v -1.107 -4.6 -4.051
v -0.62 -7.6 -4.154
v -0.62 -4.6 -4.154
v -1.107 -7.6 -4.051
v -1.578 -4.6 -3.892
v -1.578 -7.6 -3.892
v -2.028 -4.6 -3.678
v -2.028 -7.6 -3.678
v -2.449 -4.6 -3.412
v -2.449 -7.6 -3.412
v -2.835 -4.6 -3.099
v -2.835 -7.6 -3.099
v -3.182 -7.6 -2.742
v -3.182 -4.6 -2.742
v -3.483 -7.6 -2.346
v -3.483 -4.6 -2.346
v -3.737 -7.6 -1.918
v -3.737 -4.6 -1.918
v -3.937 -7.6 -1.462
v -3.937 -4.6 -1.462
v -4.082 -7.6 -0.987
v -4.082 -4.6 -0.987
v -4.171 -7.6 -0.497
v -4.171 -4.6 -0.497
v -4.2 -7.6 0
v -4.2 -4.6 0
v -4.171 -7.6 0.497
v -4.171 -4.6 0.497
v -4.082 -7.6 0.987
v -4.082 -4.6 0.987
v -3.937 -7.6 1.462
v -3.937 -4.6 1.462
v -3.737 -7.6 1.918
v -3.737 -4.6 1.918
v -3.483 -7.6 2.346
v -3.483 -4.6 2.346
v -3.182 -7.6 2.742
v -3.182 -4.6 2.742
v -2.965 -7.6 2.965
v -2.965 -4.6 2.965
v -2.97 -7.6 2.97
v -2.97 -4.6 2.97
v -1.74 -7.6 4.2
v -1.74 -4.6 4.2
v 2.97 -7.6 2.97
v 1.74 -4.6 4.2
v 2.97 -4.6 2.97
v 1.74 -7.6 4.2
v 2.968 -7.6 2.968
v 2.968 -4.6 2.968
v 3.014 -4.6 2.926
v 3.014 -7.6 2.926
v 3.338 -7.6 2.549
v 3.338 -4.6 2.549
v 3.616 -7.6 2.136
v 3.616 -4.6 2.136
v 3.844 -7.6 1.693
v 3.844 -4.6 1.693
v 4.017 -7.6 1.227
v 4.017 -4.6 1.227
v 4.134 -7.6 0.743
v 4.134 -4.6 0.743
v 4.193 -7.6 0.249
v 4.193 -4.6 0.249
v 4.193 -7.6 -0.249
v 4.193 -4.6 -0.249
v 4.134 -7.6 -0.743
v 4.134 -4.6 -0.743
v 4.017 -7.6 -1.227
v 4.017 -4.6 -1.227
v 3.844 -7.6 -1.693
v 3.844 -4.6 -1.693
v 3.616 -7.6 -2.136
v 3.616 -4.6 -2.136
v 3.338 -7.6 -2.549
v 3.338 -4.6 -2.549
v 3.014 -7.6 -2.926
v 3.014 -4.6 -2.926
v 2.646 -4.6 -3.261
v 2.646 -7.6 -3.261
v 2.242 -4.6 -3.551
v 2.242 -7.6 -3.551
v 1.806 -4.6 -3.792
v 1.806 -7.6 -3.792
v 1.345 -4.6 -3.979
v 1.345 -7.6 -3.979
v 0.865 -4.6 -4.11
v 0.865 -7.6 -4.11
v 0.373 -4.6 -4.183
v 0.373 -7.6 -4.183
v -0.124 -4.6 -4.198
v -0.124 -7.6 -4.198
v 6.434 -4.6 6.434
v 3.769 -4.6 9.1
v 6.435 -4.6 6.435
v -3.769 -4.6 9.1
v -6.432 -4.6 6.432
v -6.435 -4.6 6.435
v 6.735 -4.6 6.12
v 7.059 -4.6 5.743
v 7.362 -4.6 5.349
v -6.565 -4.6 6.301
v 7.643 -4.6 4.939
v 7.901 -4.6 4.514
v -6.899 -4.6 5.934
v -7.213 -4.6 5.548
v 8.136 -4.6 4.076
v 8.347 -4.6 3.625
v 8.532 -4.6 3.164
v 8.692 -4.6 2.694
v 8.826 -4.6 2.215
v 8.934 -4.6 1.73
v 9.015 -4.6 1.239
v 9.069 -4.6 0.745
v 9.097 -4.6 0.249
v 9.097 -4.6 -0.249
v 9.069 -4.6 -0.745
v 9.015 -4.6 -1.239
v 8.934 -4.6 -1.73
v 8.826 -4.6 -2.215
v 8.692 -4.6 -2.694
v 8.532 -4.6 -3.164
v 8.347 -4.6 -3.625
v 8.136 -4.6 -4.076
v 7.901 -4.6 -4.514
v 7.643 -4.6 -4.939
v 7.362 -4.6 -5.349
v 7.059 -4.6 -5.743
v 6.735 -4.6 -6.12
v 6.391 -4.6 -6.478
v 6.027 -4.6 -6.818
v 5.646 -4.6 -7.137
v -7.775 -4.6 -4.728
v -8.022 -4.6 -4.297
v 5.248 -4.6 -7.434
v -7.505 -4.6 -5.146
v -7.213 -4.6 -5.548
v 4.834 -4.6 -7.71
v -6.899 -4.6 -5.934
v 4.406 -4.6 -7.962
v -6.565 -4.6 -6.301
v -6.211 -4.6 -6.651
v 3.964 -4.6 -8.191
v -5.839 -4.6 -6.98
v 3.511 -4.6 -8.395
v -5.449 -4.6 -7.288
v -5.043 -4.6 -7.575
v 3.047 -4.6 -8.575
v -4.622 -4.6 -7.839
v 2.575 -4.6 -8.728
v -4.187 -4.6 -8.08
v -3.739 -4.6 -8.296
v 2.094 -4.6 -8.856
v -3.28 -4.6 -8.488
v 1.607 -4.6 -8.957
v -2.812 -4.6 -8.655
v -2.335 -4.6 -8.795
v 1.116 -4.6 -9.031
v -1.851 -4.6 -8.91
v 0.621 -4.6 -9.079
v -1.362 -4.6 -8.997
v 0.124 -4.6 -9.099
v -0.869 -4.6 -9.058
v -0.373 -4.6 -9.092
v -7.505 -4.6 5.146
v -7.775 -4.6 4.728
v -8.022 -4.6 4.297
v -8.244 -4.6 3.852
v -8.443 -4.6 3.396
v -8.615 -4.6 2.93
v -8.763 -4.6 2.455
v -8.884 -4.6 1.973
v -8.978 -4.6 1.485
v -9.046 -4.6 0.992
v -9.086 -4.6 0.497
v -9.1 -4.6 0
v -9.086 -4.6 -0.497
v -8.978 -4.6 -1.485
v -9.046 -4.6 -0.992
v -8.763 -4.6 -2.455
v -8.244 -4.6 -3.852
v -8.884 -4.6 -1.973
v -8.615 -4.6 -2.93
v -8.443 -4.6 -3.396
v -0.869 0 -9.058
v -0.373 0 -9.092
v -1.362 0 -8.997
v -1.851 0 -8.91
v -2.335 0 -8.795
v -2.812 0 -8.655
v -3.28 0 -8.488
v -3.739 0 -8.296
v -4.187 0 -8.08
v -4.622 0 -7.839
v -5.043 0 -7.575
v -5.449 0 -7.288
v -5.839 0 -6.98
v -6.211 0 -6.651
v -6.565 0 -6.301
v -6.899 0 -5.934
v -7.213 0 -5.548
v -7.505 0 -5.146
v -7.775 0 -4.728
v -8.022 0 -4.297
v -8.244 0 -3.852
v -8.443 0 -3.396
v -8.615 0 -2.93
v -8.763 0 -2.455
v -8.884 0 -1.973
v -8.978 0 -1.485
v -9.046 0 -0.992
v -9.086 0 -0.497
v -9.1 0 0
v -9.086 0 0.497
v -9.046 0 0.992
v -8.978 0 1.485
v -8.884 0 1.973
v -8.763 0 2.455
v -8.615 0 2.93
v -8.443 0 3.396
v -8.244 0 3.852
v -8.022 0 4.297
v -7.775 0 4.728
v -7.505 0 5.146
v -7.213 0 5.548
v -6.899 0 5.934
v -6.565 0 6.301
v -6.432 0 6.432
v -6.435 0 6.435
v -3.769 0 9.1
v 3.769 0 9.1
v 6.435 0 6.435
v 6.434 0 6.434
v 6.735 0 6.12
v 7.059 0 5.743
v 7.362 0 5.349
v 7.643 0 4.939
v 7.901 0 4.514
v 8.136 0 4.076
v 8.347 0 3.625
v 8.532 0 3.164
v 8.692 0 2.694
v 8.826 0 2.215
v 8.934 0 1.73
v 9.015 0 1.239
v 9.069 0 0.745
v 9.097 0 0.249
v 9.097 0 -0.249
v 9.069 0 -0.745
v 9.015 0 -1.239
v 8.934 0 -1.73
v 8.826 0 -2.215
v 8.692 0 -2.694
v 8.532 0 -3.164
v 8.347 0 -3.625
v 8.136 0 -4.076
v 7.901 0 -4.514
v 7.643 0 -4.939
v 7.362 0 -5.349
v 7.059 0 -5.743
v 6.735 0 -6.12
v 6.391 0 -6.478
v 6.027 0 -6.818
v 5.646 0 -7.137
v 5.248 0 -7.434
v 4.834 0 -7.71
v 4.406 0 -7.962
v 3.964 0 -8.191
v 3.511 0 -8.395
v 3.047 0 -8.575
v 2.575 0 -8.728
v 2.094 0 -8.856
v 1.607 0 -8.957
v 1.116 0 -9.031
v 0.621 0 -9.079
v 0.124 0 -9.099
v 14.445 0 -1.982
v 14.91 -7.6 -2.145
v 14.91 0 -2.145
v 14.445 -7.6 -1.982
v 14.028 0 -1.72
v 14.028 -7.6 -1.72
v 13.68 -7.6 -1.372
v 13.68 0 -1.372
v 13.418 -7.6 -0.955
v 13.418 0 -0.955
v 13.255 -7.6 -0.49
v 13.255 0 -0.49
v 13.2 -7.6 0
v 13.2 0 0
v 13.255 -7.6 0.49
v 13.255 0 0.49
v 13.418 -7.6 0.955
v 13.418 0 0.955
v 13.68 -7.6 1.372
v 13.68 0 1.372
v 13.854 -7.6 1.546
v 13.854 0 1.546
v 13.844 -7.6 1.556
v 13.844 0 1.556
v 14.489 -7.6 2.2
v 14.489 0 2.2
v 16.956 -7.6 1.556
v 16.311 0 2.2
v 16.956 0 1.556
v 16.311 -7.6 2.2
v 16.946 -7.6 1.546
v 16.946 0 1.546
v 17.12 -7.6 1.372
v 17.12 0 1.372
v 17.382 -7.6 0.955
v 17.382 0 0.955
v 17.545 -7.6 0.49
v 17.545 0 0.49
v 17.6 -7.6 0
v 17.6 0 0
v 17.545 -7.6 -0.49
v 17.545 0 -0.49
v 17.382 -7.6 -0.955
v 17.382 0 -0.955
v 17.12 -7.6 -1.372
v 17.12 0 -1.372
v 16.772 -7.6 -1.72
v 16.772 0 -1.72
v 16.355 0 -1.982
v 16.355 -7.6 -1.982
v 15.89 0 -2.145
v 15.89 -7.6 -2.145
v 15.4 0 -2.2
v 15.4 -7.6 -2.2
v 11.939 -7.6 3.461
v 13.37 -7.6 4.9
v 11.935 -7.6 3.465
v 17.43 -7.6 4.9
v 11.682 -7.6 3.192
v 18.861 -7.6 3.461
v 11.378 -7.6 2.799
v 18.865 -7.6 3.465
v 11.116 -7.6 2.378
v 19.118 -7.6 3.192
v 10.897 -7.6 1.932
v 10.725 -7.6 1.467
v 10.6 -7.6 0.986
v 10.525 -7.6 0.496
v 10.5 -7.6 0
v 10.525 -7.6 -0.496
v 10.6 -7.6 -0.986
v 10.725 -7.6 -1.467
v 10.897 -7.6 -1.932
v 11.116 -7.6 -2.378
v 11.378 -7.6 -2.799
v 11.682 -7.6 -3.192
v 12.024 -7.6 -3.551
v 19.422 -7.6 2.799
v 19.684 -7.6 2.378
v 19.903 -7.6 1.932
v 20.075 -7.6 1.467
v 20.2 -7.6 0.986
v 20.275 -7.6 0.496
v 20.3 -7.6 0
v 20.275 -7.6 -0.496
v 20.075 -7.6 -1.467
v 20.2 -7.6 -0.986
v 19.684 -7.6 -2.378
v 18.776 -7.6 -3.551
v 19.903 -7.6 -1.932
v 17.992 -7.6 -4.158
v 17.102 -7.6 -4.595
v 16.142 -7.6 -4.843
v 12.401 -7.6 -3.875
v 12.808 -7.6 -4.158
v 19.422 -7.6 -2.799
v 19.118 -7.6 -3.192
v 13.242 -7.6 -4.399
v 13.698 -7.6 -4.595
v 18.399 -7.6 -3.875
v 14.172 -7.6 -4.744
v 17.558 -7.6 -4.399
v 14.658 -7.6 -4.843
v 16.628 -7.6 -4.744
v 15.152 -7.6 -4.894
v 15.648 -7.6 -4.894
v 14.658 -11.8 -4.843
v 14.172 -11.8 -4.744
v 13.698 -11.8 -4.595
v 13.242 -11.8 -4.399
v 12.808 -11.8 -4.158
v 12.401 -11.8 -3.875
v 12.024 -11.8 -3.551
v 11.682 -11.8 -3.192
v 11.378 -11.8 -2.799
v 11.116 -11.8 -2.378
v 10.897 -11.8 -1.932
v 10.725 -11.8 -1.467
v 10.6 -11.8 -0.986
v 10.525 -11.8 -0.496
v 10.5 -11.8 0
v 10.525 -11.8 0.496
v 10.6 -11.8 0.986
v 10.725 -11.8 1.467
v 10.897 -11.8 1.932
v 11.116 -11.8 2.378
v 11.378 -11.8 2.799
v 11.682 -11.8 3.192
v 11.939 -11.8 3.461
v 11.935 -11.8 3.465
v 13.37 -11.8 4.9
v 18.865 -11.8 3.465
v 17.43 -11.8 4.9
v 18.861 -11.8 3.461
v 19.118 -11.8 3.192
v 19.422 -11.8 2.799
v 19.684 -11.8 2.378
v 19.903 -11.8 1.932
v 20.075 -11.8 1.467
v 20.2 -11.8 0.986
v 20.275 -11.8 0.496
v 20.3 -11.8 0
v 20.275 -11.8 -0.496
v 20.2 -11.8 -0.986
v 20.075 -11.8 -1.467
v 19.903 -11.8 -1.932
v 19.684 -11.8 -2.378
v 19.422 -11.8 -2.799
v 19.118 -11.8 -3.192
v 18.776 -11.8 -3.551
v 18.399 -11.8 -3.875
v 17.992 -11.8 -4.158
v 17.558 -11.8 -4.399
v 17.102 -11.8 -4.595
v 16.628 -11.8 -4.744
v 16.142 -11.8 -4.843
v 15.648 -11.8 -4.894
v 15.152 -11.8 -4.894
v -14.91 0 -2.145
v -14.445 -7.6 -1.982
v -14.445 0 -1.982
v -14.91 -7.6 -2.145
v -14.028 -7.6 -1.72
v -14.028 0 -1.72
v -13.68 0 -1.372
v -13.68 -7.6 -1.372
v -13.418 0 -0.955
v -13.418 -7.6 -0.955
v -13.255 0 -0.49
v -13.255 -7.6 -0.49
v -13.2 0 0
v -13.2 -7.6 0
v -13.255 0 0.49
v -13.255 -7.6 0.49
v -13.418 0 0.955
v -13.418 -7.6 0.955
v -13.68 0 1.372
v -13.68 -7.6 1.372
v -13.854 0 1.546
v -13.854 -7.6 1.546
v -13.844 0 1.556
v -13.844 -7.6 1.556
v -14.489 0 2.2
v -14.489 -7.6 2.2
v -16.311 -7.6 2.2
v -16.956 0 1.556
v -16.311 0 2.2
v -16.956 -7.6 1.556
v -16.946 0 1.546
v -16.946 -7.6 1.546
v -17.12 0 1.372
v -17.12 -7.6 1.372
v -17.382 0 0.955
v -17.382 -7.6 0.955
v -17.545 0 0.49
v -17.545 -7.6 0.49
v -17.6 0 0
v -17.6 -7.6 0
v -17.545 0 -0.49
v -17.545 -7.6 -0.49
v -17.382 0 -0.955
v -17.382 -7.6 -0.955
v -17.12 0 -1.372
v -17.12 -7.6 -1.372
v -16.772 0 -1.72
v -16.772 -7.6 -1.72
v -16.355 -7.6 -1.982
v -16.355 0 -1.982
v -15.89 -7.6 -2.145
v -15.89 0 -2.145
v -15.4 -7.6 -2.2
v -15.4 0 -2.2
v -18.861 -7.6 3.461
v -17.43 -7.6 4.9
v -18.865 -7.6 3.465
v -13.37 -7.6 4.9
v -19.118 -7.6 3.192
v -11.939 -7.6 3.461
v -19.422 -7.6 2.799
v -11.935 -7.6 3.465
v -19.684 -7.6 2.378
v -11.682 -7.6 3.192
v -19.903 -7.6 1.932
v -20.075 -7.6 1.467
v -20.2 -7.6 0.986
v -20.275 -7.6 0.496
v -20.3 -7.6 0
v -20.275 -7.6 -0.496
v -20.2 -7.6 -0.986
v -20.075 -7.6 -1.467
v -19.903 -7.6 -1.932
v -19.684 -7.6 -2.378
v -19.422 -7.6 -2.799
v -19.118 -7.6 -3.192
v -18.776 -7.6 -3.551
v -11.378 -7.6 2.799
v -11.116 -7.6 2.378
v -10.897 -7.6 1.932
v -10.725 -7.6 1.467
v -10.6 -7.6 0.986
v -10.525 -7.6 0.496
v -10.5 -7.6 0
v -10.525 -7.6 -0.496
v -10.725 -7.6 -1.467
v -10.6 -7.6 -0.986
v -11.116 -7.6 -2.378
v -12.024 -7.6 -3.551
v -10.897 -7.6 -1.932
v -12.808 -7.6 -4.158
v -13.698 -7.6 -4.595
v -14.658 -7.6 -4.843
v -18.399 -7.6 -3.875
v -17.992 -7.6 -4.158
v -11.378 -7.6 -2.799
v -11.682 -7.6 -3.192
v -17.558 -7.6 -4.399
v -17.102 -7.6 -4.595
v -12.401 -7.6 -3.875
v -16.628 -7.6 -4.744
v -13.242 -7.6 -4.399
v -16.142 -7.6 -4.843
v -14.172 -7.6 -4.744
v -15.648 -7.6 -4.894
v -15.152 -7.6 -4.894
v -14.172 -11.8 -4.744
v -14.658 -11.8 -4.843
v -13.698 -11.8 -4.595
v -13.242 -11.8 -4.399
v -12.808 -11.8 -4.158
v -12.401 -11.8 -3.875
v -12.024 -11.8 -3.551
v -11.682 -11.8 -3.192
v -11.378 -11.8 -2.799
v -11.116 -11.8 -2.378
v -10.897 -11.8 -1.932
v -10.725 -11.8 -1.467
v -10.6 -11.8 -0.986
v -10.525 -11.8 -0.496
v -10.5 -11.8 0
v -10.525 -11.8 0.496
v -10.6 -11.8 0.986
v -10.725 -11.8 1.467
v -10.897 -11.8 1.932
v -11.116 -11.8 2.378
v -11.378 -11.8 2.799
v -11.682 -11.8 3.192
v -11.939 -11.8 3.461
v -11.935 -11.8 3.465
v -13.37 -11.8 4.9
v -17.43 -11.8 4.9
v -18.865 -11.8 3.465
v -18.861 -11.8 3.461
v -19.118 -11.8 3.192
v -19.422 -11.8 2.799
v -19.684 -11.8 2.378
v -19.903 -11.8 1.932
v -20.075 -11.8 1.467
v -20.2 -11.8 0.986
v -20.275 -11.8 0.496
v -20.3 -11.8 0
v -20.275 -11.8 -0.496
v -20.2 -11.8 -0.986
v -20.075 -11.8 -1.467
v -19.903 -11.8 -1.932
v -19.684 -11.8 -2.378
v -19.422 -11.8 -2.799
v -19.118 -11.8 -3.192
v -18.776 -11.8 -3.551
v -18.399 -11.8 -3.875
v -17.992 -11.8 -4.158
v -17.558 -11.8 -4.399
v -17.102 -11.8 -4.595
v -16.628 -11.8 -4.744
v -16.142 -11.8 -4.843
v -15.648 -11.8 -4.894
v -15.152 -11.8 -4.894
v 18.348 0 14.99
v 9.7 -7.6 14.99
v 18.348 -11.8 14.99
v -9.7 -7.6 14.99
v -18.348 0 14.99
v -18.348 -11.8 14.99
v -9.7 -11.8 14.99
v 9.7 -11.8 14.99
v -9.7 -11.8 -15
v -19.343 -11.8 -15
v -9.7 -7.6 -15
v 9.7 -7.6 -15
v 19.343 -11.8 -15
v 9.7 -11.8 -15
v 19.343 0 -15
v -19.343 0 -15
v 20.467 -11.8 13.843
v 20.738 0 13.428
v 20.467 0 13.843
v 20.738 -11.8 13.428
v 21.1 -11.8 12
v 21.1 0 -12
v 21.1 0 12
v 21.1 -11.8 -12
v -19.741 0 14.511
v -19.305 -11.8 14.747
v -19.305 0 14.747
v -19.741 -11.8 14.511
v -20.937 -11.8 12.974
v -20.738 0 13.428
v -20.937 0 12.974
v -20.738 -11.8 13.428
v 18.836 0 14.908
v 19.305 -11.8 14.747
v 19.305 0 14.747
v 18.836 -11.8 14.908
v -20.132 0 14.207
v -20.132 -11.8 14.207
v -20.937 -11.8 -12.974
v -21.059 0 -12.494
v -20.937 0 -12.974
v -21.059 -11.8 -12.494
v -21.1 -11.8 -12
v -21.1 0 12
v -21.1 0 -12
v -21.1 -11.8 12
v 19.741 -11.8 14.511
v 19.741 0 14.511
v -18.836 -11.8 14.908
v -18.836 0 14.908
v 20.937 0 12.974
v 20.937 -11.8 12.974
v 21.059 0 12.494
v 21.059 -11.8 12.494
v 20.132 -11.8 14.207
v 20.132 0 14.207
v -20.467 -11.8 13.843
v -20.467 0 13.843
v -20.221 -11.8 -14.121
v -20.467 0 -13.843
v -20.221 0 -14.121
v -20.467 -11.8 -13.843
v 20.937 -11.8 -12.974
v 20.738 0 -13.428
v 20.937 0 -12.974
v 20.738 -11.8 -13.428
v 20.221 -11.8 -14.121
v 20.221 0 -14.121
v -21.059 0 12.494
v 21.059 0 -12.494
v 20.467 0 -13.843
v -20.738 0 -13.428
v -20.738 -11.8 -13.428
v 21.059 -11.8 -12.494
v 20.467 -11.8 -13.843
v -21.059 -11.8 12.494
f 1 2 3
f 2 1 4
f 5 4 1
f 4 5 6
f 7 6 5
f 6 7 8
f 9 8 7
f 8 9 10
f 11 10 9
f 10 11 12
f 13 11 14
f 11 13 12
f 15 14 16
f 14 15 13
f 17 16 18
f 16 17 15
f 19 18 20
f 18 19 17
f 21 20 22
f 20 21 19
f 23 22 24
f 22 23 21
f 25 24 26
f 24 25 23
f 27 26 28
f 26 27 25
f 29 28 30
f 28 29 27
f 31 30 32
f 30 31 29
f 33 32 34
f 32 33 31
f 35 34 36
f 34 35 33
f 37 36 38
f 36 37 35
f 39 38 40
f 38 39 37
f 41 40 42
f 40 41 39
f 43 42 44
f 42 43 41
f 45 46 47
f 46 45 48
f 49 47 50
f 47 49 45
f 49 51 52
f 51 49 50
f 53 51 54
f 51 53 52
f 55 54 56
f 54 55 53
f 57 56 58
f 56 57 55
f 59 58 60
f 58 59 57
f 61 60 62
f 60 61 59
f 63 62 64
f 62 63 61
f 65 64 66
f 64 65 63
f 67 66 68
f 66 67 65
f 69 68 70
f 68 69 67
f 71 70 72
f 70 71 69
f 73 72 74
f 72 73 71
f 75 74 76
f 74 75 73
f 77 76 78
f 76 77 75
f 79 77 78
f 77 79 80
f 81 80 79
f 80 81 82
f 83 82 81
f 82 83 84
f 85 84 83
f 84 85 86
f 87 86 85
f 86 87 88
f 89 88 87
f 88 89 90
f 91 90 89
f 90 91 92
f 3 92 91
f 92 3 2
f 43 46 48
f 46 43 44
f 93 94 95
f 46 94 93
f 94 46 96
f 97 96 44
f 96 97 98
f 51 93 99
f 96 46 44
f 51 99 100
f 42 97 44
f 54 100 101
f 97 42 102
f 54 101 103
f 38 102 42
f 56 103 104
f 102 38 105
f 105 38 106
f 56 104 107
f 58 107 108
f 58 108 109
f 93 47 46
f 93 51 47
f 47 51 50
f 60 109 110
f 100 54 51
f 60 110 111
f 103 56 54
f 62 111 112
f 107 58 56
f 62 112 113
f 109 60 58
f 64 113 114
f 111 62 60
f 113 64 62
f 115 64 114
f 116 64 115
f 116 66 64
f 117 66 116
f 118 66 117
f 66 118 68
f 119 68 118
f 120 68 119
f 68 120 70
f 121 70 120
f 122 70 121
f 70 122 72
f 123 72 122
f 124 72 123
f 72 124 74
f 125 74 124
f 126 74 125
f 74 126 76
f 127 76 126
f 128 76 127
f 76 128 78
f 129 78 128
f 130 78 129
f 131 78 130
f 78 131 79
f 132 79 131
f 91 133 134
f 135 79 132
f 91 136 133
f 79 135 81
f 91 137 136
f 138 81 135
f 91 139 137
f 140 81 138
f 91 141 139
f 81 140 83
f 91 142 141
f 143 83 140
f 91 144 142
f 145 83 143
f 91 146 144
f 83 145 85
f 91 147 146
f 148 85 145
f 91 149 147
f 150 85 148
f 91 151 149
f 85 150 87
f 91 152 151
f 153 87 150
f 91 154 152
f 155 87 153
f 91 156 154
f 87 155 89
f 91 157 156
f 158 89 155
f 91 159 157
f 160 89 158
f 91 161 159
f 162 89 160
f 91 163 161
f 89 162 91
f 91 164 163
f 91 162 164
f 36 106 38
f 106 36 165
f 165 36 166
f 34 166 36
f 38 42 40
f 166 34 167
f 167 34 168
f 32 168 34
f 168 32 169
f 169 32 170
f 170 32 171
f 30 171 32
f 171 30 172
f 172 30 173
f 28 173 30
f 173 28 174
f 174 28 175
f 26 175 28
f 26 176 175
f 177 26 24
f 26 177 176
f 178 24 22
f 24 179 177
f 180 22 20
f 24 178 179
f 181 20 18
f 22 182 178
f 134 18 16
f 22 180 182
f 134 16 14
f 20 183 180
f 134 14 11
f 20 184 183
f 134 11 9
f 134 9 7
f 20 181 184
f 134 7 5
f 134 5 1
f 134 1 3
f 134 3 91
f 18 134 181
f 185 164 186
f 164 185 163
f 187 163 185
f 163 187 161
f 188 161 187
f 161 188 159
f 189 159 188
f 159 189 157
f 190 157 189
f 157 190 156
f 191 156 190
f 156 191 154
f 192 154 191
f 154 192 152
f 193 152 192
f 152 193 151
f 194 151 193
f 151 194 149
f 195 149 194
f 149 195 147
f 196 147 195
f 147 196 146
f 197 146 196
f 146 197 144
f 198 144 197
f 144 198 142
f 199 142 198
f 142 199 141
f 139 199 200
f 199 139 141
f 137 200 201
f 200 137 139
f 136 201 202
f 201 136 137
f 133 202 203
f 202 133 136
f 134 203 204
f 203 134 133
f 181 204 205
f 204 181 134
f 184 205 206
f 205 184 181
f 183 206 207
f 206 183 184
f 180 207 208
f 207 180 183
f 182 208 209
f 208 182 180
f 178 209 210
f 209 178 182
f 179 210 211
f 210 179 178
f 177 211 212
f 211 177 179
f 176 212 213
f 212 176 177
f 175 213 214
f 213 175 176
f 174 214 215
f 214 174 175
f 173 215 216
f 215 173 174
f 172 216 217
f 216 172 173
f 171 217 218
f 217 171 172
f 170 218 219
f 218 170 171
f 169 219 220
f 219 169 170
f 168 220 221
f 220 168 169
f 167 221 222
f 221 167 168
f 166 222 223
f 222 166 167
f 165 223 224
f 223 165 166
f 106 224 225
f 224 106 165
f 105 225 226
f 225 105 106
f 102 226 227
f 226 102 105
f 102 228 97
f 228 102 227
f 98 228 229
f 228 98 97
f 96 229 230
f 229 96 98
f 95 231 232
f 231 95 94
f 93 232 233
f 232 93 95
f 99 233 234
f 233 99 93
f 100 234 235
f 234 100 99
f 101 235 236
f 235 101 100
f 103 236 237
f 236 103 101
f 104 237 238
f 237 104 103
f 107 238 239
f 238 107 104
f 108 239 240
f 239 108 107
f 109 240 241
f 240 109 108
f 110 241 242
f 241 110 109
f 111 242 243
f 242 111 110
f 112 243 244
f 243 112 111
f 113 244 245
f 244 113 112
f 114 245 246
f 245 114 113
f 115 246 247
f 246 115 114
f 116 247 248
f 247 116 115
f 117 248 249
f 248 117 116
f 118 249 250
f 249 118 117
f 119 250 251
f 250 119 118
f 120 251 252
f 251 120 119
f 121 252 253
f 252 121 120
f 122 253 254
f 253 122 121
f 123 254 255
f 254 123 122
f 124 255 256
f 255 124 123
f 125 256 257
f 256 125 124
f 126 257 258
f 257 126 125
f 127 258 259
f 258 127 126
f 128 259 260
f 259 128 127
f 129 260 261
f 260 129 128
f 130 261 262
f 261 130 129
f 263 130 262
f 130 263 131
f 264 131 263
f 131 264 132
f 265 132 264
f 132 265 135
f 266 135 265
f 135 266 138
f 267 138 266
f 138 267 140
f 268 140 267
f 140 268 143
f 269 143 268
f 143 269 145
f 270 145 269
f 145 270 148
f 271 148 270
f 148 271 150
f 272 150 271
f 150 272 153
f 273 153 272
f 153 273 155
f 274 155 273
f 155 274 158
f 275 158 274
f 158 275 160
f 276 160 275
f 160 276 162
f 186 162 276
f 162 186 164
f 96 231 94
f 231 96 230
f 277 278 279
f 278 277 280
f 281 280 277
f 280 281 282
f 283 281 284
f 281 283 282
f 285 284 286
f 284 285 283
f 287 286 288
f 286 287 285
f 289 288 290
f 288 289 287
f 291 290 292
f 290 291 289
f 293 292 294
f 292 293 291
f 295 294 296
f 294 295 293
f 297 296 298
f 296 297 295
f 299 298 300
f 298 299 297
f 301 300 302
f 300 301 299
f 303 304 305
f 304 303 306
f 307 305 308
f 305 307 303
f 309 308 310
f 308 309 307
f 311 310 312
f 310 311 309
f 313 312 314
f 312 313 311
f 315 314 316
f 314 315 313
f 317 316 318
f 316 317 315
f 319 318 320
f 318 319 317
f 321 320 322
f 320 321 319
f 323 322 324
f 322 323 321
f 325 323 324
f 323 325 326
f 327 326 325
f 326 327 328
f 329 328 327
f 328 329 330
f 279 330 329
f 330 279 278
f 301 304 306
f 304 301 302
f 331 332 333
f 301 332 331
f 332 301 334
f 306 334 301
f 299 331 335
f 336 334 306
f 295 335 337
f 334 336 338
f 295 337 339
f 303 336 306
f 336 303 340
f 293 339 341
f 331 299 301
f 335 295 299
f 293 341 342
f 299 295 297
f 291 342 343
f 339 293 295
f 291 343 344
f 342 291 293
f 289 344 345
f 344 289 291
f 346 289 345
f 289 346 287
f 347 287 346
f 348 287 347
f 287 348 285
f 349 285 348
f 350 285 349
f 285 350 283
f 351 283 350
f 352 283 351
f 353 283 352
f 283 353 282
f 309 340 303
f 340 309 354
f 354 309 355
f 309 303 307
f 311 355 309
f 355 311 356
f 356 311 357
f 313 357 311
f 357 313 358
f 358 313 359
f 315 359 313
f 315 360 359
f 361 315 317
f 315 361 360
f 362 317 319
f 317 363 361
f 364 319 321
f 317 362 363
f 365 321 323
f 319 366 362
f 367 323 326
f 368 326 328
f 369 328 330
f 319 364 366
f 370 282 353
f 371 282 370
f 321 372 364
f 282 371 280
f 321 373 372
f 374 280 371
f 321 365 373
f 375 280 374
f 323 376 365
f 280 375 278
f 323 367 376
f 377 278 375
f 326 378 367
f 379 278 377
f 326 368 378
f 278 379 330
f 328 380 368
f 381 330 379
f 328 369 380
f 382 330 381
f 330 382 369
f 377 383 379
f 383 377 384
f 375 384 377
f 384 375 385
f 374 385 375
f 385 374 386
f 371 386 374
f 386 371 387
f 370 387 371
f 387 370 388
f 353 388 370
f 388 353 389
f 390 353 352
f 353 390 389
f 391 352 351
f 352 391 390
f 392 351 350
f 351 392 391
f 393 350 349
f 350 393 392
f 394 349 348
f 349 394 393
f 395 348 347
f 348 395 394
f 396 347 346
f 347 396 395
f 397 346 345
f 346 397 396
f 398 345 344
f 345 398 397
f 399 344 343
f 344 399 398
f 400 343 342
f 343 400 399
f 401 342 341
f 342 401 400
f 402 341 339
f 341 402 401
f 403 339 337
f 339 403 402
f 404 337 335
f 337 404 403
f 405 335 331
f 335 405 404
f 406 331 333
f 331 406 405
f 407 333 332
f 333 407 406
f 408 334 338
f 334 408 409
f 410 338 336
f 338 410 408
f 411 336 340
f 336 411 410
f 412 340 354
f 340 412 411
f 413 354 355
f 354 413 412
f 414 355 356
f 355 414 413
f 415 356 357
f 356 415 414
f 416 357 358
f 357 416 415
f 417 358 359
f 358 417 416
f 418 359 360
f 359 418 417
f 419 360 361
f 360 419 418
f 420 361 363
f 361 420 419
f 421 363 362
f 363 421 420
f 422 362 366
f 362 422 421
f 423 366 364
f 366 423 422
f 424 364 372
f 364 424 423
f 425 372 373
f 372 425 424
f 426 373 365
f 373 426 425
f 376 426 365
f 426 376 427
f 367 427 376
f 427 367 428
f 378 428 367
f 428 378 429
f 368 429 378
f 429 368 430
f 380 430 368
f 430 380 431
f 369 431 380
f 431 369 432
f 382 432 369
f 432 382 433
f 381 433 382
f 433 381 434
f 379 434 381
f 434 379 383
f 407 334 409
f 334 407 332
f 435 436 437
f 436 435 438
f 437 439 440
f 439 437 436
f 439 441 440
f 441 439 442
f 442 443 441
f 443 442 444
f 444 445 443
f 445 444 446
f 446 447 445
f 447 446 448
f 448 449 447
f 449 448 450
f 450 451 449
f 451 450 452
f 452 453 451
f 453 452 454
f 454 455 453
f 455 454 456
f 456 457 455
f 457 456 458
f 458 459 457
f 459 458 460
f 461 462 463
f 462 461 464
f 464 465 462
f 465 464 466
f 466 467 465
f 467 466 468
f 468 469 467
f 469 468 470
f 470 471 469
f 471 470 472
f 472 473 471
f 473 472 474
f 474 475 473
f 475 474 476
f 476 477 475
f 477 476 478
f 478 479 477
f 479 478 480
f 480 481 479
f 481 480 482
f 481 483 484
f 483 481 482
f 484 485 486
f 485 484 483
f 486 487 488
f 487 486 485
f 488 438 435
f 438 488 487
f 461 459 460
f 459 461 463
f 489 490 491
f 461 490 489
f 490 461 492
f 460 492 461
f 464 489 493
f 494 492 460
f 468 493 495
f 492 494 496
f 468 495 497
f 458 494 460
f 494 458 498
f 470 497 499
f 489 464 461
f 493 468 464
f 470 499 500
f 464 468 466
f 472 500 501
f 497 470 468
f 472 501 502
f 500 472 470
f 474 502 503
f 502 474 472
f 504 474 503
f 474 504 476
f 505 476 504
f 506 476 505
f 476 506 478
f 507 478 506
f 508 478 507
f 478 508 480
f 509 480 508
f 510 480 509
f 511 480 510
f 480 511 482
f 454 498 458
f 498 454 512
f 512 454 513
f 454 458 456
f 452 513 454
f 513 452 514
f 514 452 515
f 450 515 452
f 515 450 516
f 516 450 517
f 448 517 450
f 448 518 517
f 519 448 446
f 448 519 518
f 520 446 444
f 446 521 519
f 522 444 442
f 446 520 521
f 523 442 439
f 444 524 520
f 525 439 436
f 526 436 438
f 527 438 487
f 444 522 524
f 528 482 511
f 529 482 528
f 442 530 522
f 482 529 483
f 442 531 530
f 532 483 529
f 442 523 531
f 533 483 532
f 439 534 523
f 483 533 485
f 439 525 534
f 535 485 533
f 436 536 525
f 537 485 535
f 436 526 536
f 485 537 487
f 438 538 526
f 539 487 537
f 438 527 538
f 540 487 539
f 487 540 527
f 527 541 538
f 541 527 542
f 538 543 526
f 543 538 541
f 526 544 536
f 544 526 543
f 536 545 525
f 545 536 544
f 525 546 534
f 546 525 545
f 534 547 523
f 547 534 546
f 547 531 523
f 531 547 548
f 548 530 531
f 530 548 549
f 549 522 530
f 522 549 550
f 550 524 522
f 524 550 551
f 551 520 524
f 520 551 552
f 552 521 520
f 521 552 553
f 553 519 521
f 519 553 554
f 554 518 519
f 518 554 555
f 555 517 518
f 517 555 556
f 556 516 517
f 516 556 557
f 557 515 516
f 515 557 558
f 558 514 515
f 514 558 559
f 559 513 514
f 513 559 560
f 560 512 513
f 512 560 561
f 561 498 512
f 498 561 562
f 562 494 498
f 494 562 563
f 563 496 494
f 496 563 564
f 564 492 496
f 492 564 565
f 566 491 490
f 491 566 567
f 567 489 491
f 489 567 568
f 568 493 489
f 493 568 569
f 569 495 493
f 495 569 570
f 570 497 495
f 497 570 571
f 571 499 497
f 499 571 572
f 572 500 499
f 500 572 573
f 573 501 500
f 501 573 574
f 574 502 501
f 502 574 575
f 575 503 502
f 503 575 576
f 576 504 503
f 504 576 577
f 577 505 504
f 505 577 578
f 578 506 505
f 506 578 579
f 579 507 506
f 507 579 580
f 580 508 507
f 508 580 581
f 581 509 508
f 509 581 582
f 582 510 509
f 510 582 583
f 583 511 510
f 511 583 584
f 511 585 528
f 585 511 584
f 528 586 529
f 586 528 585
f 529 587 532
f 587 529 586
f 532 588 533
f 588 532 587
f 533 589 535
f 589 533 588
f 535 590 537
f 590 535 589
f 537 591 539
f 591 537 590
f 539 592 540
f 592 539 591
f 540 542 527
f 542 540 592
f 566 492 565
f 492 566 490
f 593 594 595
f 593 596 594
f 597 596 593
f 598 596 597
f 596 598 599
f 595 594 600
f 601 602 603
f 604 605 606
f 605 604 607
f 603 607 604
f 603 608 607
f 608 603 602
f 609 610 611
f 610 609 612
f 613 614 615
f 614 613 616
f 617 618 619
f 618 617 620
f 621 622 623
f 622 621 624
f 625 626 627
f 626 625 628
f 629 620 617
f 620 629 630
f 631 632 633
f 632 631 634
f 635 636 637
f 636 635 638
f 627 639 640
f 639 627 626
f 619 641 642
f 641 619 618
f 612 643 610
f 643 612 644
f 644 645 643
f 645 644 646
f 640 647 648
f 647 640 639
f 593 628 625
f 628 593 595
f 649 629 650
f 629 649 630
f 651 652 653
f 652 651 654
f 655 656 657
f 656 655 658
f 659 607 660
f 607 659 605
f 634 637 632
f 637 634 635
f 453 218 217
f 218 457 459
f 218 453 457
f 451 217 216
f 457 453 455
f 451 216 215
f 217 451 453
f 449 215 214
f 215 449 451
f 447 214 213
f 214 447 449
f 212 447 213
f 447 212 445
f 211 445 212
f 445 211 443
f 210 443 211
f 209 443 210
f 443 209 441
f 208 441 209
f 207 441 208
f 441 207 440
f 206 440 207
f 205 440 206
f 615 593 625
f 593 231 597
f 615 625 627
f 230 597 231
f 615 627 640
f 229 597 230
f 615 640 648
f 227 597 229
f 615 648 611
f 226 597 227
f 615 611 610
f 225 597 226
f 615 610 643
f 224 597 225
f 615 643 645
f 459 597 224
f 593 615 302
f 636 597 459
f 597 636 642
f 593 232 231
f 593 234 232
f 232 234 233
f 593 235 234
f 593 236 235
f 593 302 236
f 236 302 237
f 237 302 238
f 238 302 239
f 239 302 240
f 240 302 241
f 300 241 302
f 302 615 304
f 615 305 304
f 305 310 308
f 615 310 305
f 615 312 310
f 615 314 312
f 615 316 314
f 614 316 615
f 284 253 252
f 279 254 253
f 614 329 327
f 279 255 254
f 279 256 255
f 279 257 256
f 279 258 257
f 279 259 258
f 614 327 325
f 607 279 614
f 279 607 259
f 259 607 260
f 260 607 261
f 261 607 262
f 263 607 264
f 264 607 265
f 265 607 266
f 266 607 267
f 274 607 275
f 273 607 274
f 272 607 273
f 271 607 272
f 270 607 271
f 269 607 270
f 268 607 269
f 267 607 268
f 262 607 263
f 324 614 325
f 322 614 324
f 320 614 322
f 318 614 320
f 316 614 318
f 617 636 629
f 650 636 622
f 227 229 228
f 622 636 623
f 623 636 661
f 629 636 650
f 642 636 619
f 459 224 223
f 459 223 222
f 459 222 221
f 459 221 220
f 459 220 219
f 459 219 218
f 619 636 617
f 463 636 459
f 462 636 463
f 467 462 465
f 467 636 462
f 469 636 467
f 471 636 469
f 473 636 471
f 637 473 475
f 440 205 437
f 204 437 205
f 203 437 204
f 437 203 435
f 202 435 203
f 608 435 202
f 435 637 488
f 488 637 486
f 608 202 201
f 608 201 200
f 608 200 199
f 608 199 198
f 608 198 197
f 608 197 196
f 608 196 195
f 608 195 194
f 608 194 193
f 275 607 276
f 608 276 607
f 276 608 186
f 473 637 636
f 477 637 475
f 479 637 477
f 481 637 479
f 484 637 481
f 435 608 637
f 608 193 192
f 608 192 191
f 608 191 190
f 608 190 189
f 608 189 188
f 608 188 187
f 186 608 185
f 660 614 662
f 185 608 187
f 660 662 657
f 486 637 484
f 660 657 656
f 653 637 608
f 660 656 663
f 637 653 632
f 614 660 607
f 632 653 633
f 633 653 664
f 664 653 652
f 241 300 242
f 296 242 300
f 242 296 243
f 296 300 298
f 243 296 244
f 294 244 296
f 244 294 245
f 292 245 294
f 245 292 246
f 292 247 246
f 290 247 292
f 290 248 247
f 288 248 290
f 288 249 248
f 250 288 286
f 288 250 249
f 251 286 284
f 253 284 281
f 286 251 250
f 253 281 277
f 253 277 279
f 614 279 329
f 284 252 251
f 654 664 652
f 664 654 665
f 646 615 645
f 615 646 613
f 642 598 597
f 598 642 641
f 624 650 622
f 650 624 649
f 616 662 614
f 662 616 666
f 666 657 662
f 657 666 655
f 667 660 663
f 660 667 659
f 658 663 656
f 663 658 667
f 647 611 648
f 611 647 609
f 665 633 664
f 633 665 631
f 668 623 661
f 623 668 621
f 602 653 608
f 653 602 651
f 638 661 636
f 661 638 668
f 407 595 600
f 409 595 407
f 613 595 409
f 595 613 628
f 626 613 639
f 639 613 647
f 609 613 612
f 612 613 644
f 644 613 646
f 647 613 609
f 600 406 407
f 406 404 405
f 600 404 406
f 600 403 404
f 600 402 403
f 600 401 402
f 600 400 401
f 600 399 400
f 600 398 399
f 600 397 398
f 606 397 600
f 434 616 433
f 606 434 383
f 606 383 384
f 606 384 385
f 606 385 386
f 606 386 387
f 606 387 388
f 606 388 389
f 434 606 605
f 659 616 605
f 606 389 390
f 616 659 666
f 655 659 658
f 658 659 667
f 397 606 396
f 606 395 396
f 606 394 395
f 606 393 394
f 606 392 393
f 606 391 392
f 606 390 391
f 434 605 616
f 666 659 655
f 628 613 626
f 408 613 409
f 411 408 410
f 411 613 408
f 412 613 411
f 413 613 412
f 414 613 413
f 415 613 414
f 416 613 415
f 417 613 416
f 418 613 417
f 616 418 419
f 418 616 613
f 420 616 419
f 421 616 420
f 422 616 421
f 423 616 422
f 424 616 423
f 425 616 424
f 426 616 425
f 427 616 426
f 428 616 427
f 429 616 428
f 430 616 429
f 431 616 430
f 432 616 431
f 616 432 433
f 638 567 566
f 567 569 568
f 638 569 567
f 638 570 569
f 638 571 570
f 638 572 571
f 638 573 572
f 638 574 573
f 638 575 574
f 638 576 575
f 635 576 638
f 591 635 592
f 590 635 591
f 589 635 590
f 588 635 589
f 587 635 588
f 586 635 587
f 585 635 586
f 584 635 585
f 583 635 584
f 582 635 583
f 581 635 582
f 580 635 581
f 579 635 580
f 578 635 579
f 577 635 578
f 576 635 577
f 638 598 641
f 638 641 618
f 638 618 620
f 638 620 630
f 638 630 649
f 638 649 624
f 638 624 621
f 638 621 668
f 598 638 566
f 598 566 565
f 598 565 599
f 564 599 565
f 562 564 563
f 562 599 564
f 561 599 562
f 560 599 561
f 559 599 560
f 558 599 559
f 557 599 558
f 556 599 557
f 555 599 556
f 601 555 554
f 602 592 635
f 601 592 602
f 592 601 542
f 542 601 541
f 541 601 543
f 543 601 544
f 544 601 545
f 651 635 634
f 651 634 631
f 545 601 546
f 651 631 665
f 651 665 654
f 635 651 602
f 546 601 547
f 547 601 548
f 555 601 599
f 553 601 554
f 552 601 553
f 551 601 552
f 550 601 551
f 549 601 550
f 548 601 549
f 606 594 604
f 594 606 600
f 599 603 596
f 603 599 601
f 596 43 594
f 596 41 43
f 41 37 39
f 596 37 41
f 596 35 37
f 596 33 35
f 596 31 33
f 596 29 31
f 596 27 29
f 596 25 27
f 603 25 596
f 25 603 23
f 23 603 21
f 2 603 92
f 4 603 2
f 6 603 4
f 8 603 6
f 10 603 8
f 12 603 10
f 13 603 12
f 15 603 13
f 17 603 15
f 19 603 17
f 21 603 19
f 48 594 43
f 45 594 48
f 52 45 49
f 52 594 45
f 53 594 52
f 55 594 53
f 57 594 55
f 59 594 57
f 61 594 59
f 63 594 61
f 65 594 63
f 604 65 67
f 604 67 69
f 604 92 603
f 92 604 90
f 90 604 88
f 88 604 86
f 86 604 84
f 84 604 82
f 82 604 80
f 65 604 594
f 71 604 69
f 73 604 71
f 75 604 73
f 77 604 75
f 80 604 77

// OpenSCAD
// file: functions.scad
/*******************************************************************

This OpenSCAD code and its rendered 3D model are part of the

	Kühling&Kühling RepRap Industrial 3D Printer


All details, BOM, assembling instructions and latest sources:
	http://kuehlingkuehling.de

Designed and developed by:
	Jonas Kühling <mail@jonaskuehling.de>
	Simon Kühling <mail@simonkuehling.de>

License:
	Creative Commons Attribution-ShareAlike 4.0 International (CC BY-SA 4.0)
	https://creativecommons.org/licenses/by-sa/4.0/

*******************************************************************/

module teardrop (r=4.5,h=20,alpha=45,teardropcorner=0,fulldrop=0){		// tear drop hole for top-centering
											// use teardropcorner=1 for bottom horizontal corners
	render()
	translate([-h/2,0,0])
		rotate([-270,0+(teardropcorner*180),90])
			difference(){
				linear_extrude(height=h){
					circle(r);
					polygon(points=[[0,0],[r*cos(alpha),r*sin(alpha)],[0,r/sin(alpha)],[-r*cos(alpha),r*sin(alpha)]], paths=[[0,1,2,3]]);
				}
				if(fulldrop==0) 
					translate([0,(r/sin(alpha))/2+r,h/2]) cube([2*r+2,r/sin(alpha),h+2],center=true);
			}
}

//teardrop(4.5,22,fulldrop=true);



module teardropcentering (r=4.5,h=20,alpha=45){				// tear drop hole for top-centering
	centering_offset_factor = 1.1;
	render()
	translate([-h/2,0,0])
		rotate([-270,0,90])
			difference(){
				linear_extrude(height=h){
					circle(r, $fn=24);
					polygon(points=[[0,0],[r*cos(alpha),r*sin(alpha)],[0,r/sin(alpha)],[-r*cos(alpha),r*sin(alpha)]], paths=[[0,1,2,3]]);
				}
				translate([0,(r/sin(alpha))/2+r*centering_offset_factor,h/2]) cube([2*r+2,r/sin(alpha),h+2],center=true);
			}
}

//teardropcentering();



module teardropcentering_half (r=4.5,h=20, bottom=0,alpha=45){				// tear drop hole for top-centering
																// upper half (bottom=0) or bottom half (bottom=1)
	centering_offset_factor = 1.2;
	render()
	translate([-h/2,0,0])
		rotate([-270,0,90])
			difference(){
				linear_extrude(height=h){
					circle(r, $fn=24);
					polygon(points=[[0,0],[r*cos(alpha),r*sin(alpha)],[0,r/sin(alpha)],[-r*cos(alpha),r*sin(alpha)]], paths=[[0,1,2,3]]);
				}
				translate([0,(r/sin(alpha))/2+r*centering_offset_factor,h/2]) cube([2*r+2,r/sin(alpha),h+2],center=true);
				translate([0,-(r*centering_offset_factor)/2-0.5+bottom*(r*centering_offset_factor+1),h/2]) cube([2*r+2,r*centering_offset_factor+1,h+2],center=true);
			}
}

//teardropcentering_half(bottom=0);


module polyhole(d,h){
	n = max(round(2 * d),3);
	cylinder(h = h, r = (d / 2) / cos (180 / n), $fn = n, center=true);
}



module roundcorner(radius,edge_length){
	render()
	translate([0,0,-1])
		difference(){
			translate([-1,-1,0])
				cube(size = [radius+1,radius+1,edge_length+2], center = false);
			translate(v = [radius,radius,-1])
				cylinder(h = edge_length+4, r=radius, center=false,$fs=0.1);
		}
}

//roundcorner(5,5);



module roundcorner_tear(radius,edge_length){
	render()
	difference(){
		translate([-1,-1,-1])
			cube(size = [edge_length+2, radius+1, radius+1], center = false);
		translate([(edge_length+4)/2-2, radius, radius])
			teardrop(radius, edge_length+4,teardropcorner=1);
	}
}

//roundcorner_tear(8,20);


module roundedge_tear(radius){
	render()
	difference(){
		translate([-1,-1,-1])
			cube(size = [radius+1, radius+1, radius+1], center = false);
		translate([radius,radius,radius])
			union(){
				sphere(r=radius, $fs=0.1);
				translate([0,0,-radius])
					cylinder(r1=(radius*sin(45))-(radius-(radius*sin(45))),r2=radius*sin(45),h=(radius-(radius*sin(45))), $fs=0.1);
			}
	}
}

//roundedge_tear(20);



module roundedge(radius){
	render()
	difference(){
		translate([-1,-1,-1])
			cube(size = [radius+1, radius+1, radius+1], center = false);
		translate([radius,radius,radius])
			sphere(r=radius, $fs=0.1);
	}
}

//roundedge(5);


module nut_trap(nut_wrench_size,trap_height,vertical=0, clearance=0.2,center=true){		// M3 wrench size = 5.5
	radius = cornerdiameter(nut_wrench_size+2*clearance) /2;
	rotate([0,vertical*90,0])
		cylinder(h = trap_height, r = radius, center=center, $fn = 6);
}

module nut_trap_square(nut_wrench_size,trap_height,vertical=0, clearance=0.2,center=true){		// M3 wrench size = 5.5
	rotate([0,vertical*90,0])
		cube([nut_wrench_size+2*clearance,nut_wrench_size+2*clearance,trap_height],center=center);
}

//nut_trap_square(5,5,0);

module nut_slot(nut_wrench_size,nut_height, nut_elevation,vertical=0, clearance=0.2){		// M3 wrench size = 5.5
	radius = cornerdiameter(nut_wrench_size+2*clearance) /2;
	slot_height = nut_height+2*clearance;
	slot_width = nut_wrench_size+2*clearance;
	rotate([0,vertical*270,0]){
		cylinder(h = slot_height, r = radius, center=true, $fn = 6);
		translate([0,-slot_width/2,-slot_height/2]) cube([nut_elevation+1,slot_width,slot_height]);
	}
}

module nut_slot_square(nut_wrench_size,nut_height, nut_elevation,vertical=0, clearance=0.2){		// M3 wrench size = 5.5
	slot_height = nut_height+2*clearance;
	slot_width = nut_wrench_size+2*clearance;
	rotate([0,vertical*270,0]){
		cube([slot_width,slot_width,slot_height],center=true);
		translate([0,-slot_width/2,-slot_height/2]) cube([nut_elevation+1,slot_width,slot_height]);
	}
}

//nut_slot_square(5.5,3,4,1);

function cornerdiameter(wrench_size) =  2* ((wrench_size)/2)/ cos(180/6);
function cornerdiameter_8(wrench_size) =  2* ((wrench_size)/2)/ cos(180/8);
function cornerdiameter_4(wrench_size) =  2* ((wrench_size)/2)/ cos(180/4);
// main file
/*******************************************************************

This OpenSCAD code and its rendered 3D model are part of the

	Kühling&Kühling RepRap Industrial 3D Printer


All details, BOM, assembling instructions and latest sources:
	http://kuehlingkuehling.de

Designed and developed by:
	Jonas Kühling <mail@jonaskuehling.de>
	Simon Kühling <mail@simonkuehling.de>

License:
	Creative Commons Attribution-ShareAlike 4.0 International (CC BY-SA 4.0)
	https://creativecommons.org/licenses/by-sa/4.0/

*******************************************************************/

include <configuration.scad>





// RENDERING
frame_small_mount();




module frame_small_mount(){
	difference(){

		// main body
		hull(){
			translate([frame_small_mount_body_width/2-wall,-frame_small_mount_body_length/2,-frame_small_mount_body_height/2+wall])
				rotate([0,0,90])
					rotate([180,0,0])
						teardrop(wall,frame_small_mount_body_length);
			translate([-frame_small_mount_body_width/2+wall,-frame_small_mount_body_length/2,-frame_small_mount_body_height/2+wall])
				rotate([0,0,90])
					rotate([180,0,0])
						teardrop(wall,frame_small_mount_body_length);
			translate([frame_small_mount_body_width/2-wall,-frame_small_mount_body_length/2,frame_small_mount_body_height/2-wall])
				rotate([0,0,90])
					rotate([180,0,0])
						teardrop(wall,frame_small_mount_body_length);
			translate([-frame_small_mount_body_width/2+wall,-frame_small_mount_body_length/2,frame_small_mount_body_height/2-wall])
				rotate([0,0,90])
					rotate([180,0,0])
						teardrop(wall,frame_small_mount_body_length);
		}

		// extrusion center mount hole
		translate([0,-(frame_small_mount_body_length)/2+wall,0])
			rotate([0,0,90])
				teardrop(frame_center_screw_dia/2+clearance,frame_small_mount_body_length+2);
		translate([0,frame_small_mount_body_length/2-frame_center_screw_head_length-clearance,0])
			rotate([0,0,90])
				teardrop(frame_center_screw_washer_dia/2+clearance,frame_small_mount_body_length);

		// extrusion clearance
		translate([-(frame_width_small+2*clearance)/2,-frame_small_mount_body_length-frame_center_screw_head_length-clearance-wall,-frame_small_mount_body_height/2-1])
			cube([frame_width_small+2*clearance,frame_small_mount_body_length,frame_small_mount_body_height+2]);

		// frame mount screw holes
		for(i=[0,1])
			mirror([i,0,0]){
				translate([frame_small_mount_body_width/2-wall_thin-clearance-frame_screw_washer_dia/2,-frame_small_mount_body_length/2,0])
					rotate([0,0,90])
						teardrop(frame_screw_dia/2+clearance,frame_small_mount_body_length+2);
				translate([frame_small_mount_body_width/2-wall_thin-clearance-frame_screw_washer_dia/2,-frame_small_mount_body_length/2-frame_center_screw_head_length-clearance-wall,0])
					rotate([0,0,90])
						teardrop(frame_screw_head_flange_dia/2+clearance,frame_small_mount_body_length);
				}
	}
}
